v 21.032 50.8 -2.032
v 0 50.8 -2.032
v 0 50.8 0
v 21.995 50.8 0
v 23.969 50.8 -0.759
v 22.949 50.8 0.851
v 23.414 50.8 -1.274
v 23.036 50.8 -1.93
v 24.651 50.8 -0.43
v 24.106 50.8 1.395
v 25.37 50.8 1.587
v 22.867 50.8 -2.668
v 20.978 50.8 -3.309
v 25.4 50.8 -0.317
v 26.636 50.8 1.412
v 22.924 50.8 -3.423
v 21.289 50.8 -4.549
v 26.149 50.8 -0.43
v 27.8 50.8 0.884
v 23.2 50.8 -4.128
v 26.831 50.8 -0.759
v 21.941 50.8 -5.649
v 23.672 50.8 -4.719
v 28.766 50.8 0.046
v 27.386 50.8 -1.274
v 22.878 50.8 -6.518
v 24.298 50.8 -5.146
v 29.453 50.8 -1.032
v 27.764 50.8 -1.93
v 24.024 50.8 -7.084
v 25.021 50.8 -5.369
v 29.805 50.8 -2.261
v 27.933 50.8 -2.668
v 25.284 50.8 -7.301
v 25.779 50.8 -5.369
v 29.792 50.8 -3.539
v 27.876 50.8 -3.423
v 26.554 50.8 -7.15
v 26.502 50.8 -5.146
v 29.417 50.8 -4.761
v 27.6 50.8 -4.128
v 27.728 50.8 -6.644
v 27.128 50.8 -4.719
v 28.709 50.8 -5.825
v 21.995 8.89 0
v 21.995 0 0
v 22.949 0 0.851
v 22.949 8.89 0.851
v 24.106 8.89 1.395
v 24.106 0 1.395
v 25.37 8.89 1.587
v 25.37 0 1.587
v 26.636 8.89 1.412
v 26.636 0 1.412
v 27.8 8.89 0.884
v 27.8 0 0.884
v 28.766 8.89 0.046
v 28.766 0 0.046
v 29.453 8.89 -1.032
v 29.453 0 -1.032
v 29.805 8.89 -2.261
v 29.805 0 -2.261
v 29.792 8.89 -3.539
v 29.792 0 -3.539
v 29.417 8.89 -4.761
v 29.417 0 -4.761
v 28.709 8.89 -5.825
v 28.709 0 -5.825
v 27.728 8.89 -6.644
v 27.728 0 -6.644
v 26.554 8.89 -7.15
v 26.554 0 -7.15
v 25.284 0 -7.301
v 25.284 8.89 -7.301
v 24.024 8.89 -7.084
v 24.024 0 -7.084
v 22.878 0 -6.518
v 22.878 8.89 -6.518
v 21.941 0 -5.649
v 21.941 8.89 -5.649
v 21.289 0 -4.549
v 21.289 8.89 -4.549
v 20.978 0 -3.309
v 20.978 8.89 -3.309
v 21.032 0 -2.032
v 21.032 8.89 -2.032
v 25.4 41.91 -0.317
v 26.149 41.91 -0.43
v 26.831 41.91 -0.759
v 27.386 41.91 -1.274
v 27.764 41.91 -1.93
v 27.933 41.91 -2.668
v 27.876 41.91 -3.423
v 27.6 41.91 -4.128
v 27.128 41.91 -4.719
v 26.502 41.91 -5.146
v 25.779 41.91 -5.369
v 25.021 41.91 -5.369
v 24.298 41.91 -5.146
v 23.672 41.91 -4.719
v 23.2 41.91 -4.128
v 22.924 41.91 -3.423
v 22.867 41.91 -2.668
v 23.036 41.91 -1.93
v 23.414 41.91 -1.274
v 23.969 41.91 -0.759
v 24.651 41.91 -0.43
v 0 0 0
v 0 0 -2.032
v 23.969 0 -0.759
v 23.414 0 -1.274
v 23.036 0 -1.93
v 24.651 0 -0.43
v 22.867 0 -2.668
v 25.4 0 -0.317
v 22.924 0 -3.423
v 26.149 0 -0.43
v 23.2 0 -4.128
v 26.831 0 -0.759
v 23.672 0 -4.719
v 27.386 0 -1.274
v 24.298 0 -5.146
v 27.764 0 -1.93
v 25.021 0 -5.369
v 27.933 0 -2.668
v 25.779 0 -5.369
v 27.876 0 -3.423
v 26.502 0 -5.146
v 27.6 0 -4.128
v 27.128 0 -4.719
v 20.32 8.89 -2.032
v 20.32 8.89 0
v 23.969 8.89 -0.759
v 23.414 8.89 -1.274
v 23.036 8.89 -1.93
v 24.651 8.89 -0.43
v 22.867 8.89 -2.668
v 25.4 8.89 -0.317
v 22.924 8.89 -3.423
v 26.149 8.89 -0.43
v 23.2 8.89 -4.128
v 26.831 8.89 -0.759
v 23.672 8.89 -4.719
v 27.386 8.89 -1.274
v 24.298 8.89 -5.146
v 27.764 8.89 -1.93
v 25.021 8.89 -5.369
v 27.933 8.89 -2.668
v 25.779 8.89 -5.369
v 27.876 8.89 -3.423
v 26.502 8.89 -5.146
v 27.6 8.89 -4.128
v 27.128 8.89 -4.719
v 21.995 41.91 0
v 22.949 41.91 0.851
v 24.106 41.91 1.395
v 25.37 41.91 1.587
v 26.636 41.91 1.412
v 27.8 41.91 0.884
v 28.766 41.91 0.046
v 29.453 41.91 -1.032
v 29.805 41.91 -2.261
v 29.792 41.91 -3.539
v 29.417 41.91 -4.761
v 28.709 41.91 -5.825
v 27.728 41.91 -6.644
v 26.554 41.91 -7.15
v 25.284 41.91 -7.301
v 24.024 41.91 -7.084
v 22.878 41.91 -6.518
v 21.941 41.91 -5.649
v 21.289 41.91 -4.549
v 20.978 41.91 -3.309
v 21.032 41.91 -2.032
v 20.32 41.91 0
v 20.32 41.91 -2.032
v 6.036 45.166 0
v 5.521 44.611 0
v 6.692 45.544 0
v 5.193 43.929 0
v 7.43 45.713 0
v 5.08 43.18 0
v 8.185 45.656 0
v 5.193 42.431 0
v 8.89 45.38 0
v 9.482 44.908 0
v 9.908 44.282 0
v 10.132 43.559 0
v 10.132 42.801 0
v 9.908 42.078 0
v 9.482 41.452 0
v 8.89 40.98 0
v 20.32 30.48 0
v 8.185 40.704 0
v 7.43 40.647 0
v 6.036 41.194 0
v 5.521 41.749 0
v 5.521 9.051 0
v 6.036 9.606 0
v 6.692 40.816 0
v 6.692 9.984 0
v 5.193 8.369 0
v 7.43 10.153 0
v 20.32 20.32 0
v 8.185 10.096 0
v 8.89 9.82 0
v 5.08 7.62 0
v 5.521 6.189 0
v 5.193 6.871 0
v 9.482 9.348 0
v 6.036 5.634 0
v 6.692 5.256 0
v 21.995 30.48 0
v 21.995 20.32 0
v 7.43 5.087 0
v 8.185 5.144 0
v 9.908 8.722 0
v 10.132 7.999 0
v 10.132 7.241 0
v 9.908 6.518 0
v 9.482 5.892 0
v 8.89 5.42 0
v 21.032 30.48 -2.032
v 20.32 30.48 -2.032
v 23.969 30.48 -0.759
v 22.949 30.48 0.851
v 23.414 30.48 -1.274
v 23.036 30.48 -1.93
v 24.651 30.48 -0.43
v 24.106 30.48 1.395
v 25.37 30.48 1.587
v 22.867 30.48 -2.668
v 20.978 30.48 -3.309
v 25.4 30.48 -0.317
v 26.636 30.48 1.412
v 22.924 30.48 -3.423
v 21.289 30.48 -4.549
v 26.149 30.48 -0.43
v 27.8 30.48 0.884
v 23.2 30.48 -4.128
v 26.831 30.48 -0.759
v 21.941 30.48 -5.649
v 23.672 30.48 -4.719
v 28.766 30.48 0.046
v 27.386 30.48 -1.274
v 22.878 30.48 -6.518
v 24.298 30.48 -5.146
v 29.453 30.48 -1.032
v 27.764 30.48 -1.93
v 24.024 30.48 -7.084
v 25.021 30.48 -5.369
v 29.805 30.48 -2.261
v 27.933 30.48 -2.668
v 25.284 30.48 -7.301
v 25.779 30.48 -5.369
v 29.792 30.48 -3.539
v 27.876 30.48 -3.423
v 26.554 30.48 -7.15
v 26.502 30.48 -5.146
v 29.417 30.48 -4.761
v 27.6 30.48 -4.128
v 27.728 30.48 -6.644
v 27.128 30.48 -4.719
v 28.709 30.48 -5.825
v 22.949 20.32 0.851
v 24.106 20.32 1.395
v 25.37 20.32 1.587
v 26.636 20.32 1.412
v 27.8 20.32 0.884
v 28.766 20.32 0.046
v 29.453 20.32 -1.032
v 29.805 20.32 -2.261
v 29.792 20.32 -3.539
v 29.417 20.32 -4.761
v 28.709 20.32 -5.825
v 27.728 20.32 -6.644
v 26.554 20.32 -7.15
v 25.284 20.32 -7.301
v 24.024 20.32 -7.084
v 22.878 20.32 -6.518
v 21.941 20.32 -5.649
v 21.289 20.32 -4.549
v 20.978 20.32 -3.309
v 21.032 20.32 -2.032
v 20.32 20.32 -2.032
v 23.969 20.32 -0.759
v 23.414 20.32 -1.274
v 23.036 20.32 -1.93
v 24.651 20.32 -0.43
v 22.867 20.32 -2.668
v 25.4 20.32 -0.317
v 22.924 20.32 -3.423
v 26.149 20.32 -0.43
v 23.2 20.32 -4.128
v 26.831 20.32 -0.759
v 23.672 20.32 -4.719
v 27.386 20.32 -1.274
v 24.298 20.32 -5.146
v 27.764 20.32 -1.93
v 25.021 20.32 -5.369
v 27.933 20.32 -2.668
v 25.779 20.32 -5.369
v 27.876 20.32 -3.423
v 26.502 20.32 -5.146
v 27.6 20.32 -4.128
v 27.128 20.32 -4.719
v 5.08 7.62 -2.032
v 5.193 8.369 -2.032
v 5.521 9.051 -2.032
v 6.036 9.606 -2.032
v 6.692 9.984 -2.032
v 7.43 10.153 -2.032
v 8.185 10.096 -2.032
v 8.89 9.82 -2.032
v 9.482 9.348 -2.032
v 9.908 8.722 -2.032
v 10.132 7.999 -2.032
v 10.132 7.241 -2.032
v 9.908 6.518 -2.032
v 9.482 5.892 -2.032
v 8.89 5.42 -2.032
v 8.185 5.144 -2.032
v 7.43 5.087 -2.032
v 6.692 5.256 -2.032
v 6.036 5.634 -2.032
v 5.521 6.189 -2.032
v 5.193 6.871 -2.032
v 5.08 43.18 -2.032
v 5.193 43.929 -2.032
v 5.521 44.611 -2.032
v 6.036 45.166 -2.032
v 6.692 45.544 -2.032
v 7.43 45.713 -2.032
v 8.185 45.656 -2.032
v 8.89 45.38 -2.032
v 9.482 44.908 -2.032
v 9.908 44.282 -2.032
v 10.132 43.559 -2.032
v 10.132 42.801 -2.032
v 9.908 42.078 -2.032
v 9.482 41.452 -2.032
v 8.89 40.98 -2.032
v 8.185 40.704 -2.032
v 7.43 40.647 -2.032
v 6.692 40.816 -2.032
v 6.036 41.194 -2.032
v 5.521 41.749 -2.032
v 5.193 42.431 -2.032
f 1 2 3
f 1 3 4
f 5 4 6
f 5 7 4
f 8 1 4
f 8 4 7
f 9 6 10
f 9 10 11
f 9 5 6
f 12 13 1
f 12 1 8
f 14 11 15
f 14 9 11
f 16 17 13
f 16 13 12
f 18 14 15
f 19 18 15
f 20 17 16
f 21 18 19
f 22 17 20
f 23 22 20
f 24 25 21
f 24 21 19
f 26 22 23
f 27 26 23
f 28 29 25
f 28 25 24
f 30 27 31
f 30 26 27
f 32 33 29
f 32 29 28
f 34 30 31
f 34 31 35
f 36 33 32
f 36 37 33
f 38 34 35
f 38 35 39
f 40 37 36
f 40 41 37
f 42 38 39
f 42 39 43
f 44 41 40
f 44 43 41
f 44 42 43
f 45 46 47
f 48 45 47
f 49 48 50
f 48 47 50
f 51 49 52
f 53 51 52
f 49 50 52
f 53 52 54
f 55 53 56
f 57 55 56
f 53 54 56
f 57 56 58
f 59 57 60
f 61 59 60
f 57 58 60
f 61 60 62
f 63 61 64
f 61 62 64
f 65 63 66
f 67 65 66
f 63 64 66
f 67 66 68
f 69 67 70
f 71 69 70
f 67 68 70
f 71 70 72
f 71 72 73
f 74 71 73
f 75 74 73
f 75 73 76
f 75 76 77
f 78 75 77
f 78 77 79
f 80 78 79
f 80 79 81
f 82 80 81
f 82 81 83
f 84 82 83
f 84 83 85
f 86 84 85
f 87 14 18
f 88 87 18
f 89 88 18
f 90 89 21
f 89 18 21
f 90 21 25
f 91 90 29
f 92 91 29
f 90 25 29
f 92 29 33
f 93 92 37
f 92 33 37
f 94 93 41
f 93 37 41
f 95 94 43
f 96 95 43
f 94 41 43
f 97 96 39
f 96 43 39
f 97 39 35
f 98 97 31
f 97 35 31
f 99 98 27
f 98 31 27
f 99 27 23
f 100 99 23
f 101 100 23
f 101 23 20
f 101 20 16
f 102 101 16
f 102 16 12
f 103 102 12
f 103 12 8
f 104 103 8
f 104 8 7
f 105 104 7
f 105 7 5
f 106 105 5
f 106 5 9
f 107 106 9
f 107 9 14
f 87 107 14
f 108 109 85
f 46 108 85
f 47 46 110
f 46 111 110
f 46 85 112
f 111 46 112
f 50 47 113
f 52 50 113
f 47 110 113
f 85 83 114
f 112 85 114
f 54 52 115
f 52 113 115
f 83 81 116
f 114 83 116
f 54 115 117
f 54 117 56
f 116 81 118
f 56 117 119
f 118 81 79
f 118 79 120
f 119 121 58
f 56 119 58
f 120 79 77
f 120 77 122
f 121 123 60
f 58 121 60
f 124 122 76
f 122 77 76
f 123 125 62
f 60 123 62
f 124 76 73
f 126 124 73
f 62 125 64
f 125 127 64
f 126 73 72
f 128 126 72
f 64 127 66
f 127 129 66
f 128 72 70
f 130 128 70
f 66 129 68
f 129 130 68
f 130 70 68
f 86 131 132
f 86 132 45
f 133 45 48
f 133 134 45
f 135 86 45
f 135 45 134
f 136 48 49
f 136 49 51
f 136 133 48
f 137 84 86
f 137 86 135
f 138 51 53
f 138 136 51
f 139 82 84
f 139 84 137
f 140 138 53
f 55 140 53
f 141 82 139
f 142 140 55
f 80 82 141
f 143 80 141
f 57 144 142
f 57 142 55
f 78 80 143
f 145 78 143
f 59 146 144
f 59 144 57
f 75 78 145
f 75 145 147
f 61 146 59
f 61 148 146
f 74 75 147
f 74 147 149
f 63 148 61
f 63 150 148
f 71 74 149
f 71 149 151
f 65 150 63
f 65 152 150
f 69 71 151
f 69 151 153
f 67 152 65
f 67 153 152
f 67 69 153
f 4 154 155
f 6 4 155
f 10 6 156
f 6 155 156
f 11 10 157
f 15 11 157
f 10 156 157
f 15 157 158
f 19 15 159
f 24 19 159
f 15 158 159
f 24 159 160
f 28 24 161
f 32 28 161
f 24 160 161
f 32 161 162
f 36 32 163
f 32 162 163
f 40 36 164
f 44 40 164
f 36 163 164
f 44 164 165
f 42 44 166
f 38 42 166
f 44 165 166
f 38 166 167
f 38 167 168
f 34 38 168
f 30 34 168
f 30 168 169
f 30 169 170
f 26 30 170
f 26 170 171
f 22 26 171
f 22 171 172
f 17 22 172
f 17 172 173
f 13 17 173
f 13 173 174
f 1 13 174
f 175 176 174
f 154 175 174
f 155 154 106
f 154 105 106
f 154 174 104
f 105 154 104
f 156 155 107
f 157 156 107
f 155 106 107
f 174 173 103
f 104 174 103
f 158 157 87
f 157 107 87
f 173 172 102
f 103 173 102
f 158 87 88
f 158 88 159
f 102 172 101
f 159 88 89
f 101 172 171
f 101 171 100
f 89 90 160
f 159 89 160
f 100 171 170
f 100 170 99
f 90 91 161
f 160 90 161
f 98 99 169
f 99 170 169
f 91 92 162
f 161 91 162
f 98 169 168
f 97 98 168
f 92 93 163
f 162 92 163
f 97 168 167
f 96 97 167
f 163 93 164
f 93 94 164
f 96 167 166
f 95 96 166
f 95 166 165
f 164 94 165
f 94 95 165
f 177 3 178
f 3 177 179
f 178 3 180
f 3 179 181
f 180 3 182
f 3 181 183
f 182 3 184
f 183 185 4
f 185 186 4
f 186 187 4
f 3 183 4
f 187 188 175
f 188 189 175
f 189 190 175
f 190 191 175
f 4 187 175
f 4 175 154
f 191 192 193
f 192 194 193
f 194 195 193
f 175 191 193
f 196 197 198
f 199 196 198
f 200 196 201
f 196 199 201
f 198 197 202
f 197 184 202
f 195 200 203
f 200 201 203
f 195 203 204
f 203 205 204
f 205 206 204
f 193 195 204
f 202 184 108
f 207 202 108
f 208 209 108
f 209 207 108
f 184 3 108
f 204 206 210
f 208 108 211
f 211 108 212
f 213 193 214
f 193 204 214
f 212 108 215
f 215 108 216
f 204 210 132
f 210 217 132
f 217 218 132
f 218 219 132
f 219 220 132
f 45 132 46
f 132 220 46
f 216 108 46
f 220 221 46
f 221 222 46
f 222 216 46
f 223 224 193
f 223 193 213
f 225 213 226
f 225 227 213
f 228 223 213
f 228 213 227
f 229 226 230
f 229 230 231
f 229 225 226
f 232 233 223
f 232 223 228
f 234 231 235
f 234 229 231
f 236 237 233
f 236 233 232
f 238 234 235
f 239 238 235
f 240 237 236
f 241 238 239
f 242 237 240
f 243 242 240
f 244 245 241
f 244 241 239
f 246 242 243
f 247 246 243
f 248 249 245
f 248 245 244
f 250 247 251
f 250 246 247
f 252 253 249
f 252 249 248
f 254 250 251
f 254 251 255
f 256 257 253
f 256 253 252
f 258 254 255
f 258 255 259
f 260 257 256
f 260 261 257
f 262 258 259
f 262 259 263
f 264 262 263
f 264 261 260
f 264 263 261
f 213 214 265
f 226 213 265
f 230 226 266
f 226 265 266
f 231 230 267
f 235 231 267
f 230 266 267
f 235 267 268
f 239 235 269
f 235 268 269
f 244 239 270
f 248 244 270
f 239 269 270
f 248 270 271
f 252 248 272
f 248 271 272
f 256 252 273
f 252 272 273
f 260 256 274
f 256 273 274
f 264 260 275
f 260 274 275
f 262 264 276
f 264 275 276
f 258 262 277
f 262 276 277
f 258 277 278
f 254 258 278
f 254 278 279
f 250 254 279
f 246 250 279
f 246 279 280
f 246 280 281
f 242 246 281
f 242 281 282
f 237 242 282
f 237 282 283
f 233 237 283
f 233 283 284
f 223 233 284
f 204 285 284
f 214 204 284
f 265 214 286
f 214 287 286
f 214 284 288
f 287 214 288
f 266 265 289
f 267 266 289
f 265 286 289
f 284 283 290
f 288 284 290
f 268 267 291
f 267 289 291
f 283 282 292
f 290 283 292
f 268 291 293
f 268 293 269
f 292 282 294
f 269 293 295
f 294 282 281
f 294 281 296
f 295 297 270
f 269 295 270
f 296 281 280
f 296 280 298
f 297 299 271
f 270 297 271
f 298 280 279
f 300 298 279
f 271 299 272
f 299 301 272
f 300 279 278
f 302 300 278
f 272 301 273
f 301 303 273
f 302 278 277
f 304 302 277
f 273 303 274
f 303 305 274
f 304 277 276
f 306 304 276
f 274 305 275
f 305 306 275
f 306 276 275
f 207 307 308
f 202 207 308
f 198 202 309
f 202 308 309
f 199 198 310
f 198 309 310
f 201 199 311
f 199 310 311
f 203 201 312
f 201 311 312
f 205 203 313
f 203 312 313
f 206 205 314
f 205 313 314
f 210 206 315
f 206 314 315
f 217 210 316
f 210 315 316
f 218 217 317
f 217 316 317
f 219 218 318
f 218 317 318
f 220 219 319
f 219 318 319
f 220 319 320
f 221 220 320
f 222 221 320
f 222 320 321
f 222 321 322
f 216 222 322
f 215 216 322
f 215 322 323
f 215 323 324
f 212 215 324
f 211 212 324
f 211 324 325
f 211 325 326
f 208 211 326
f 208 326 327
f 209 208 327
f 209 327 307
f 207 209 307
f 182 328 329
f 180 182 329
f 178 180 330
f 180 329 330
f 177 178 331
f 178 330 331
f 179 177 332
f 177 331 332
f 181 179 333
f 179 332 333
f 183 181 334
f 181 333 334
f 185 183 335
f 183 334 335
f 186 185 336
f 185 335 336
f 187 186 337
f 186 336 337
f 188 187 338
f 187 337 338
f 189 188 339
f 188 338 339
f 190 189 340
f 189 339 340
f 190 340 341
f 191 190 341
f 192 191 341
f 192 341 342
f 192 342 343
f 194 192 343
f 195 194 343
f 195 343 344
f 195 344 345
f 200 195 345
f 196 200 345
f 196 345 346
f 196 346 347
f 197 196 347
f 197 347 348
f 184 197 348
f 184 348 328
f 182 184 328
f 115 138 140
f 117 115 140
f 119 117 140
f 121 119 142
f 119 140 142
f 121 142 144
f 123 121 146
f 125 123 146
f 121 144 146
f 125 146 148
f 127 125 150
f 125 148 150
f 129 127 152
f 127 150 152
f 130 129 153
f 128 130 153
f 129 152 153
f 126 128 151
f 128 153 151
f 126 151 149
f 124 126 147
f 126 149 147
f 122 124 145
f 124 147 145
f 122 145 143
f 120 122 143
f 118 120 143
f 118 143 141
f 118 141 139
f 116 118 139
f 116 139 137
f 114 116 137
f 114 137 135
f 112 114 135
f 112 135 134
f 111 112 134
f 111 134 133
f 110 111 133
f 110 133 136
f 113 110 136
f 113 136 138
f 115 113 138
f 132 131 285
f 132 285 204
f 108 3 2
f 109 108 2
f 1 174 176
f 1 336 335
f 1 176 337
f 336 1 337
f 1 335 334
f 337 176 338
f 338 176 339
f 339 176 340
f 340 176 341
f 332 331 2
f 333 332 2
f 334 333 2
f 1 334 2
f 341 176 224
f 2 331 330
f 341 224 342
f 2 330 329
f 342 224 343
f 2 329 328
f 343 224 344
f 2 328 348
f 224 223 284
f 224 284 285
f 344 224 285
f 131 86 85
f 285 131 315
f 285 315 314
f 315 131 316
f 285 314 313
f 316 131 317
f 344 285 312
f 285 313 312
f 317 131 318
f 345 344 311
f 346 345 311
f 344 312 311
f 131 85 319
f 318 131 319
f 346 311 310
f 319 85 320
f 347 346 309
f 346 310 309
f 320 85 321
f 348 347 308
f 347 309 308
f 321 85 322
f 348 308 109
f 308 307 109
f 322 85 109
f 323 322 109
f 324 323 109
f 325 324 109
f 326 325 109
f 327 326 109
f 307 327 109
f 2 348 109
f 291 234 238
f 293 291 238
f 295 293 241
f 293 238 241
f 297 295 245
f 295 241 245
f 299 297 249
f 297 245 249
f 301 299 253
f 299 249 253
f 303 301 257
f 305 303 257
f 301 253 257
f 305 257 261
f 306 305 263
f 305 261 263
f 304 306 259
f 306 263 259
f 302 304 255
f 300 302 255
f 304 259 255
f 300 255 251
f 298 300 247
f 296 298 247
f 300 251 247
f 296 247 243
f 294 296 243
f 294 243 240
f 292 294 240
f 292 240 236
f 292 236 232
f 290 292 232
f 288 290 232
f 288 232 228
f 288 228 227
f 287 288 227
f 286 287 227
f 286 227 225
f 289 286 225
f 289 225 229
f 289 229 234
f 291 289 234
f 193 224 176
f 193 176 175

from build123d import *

# Parameters (mm, degrees)
BOSS_EXTRUDE1_DEPTH = 50.8
SKETCH2_R           = 2.54
CUT_EXTRUDE1_DEPTH  = 50.8
CUT_EXTRUDE2_START  = 8.89
CUT_EXTRUDE2_DEPTH  = 11.43
CUT_EXTRUDE3_START  = 30.48
CUT_EXTRUDE3_DEPTH  = 11.43
SKETCH3_R           = 2.54
CUT_EXTRUDE4_DEPTH  = 60.369104181


with BuildPart() as part:
    # Sketch1 → Boss-Extrude1 (new body)
    with BuildSketch(Plane(origin=(0, 0, 0), x_dir=(1, 0, 0), z_dir=(0, 1, 0))):
        with BuildLine():
            Line((0, 0), (21.995191819, 0))
            ThreePointArc((21.995191819, 0), (29.416855136, 4.760891662), (21.032326163, 2.032))
            Line((21.032326163, 2.032), (0, 2.032))
            Line((0, 2.032), (0, 0))
        make_face()
    extrude(amount=BOSS_EXTRUDE1_DEPTH)

    # Sketch2 → Cut-Extrude1 (cut)
    with BuildSketch(Plane(origin=(0, 0, -2.032), x_dir=(-1, 0, 0), z_dir=(0, 0, -1))):
        with Locations((-7.62, 43.18)):
            Circle(SKETCH2_R)
        with Locations((-7.62, 7.62)):
            Circle(SKETCH2_R)
    extrude(amount=-CUT_EXTRUDE1_DEPTH, mode=Mode.SUBTRACT)

    # Sketch1<3> → Cut-Extrude2 (cut)
    with BuildSketch(Plane(origin=(0, 0, 0), x_dir=(1, 0, 0), z_dir=(0, 1, 0)).offset(CUT_EXTRUDE2_START)):
        with BuildLine():
            Line((21.032326163, 2.032), (20.32, 2.032))
            Line((20.32, 2.032), (20.32, 0))
            Line((20.32, 0), (21.995191819, 0))
            ThreePointArc((21.995191819, 0), (29.416855136, 4.760891662), (21.032326163, 2.032))
        make_face()
    extrude(amount=CUT_EXTRUDE2_DEPTH, mode=Mode.SUBTRACT)

    # Sketch1<5> → Cut-Extrude3 (cut)
    with BuildSketch(Plane(origin=(0, 0, 0), x_dir=(1, 0, 0), z_dir=(0, 1, 0)).offset(CUT_EXTRUDE3_START)):
        with BuildLine():
            Line((21.032326163, 2.032), (20.32, 2.032))
            Line((20.32, 2.032), (20.32, 0))
            Line((20.32, 0), (21.995191819, 0))
            ThreePointArc((21.995191819, 0), (29.416855136, 4.760891662), (21.032326163, 2.032))
        make_face()
    extrude(amount=CUT_EXTRUDE3_DEPTH, mode=Mode.SUBTRACT)

    # Sketch3 → Cut-Extrude4 (cut, through all)
    with BuildSketch(Plane(origin=(0, 50.8, 0), x_dir=(1, 0, 0), z_dir=(0, 1, 0))):
        with Locations((25.4, 2.8575)):
            Circle(SKETCH3_R)
    extrude(amount=-CUT_EXTRUDE4_DEPTH, mode=Mode.SUBTRACT)


solid = part.part
